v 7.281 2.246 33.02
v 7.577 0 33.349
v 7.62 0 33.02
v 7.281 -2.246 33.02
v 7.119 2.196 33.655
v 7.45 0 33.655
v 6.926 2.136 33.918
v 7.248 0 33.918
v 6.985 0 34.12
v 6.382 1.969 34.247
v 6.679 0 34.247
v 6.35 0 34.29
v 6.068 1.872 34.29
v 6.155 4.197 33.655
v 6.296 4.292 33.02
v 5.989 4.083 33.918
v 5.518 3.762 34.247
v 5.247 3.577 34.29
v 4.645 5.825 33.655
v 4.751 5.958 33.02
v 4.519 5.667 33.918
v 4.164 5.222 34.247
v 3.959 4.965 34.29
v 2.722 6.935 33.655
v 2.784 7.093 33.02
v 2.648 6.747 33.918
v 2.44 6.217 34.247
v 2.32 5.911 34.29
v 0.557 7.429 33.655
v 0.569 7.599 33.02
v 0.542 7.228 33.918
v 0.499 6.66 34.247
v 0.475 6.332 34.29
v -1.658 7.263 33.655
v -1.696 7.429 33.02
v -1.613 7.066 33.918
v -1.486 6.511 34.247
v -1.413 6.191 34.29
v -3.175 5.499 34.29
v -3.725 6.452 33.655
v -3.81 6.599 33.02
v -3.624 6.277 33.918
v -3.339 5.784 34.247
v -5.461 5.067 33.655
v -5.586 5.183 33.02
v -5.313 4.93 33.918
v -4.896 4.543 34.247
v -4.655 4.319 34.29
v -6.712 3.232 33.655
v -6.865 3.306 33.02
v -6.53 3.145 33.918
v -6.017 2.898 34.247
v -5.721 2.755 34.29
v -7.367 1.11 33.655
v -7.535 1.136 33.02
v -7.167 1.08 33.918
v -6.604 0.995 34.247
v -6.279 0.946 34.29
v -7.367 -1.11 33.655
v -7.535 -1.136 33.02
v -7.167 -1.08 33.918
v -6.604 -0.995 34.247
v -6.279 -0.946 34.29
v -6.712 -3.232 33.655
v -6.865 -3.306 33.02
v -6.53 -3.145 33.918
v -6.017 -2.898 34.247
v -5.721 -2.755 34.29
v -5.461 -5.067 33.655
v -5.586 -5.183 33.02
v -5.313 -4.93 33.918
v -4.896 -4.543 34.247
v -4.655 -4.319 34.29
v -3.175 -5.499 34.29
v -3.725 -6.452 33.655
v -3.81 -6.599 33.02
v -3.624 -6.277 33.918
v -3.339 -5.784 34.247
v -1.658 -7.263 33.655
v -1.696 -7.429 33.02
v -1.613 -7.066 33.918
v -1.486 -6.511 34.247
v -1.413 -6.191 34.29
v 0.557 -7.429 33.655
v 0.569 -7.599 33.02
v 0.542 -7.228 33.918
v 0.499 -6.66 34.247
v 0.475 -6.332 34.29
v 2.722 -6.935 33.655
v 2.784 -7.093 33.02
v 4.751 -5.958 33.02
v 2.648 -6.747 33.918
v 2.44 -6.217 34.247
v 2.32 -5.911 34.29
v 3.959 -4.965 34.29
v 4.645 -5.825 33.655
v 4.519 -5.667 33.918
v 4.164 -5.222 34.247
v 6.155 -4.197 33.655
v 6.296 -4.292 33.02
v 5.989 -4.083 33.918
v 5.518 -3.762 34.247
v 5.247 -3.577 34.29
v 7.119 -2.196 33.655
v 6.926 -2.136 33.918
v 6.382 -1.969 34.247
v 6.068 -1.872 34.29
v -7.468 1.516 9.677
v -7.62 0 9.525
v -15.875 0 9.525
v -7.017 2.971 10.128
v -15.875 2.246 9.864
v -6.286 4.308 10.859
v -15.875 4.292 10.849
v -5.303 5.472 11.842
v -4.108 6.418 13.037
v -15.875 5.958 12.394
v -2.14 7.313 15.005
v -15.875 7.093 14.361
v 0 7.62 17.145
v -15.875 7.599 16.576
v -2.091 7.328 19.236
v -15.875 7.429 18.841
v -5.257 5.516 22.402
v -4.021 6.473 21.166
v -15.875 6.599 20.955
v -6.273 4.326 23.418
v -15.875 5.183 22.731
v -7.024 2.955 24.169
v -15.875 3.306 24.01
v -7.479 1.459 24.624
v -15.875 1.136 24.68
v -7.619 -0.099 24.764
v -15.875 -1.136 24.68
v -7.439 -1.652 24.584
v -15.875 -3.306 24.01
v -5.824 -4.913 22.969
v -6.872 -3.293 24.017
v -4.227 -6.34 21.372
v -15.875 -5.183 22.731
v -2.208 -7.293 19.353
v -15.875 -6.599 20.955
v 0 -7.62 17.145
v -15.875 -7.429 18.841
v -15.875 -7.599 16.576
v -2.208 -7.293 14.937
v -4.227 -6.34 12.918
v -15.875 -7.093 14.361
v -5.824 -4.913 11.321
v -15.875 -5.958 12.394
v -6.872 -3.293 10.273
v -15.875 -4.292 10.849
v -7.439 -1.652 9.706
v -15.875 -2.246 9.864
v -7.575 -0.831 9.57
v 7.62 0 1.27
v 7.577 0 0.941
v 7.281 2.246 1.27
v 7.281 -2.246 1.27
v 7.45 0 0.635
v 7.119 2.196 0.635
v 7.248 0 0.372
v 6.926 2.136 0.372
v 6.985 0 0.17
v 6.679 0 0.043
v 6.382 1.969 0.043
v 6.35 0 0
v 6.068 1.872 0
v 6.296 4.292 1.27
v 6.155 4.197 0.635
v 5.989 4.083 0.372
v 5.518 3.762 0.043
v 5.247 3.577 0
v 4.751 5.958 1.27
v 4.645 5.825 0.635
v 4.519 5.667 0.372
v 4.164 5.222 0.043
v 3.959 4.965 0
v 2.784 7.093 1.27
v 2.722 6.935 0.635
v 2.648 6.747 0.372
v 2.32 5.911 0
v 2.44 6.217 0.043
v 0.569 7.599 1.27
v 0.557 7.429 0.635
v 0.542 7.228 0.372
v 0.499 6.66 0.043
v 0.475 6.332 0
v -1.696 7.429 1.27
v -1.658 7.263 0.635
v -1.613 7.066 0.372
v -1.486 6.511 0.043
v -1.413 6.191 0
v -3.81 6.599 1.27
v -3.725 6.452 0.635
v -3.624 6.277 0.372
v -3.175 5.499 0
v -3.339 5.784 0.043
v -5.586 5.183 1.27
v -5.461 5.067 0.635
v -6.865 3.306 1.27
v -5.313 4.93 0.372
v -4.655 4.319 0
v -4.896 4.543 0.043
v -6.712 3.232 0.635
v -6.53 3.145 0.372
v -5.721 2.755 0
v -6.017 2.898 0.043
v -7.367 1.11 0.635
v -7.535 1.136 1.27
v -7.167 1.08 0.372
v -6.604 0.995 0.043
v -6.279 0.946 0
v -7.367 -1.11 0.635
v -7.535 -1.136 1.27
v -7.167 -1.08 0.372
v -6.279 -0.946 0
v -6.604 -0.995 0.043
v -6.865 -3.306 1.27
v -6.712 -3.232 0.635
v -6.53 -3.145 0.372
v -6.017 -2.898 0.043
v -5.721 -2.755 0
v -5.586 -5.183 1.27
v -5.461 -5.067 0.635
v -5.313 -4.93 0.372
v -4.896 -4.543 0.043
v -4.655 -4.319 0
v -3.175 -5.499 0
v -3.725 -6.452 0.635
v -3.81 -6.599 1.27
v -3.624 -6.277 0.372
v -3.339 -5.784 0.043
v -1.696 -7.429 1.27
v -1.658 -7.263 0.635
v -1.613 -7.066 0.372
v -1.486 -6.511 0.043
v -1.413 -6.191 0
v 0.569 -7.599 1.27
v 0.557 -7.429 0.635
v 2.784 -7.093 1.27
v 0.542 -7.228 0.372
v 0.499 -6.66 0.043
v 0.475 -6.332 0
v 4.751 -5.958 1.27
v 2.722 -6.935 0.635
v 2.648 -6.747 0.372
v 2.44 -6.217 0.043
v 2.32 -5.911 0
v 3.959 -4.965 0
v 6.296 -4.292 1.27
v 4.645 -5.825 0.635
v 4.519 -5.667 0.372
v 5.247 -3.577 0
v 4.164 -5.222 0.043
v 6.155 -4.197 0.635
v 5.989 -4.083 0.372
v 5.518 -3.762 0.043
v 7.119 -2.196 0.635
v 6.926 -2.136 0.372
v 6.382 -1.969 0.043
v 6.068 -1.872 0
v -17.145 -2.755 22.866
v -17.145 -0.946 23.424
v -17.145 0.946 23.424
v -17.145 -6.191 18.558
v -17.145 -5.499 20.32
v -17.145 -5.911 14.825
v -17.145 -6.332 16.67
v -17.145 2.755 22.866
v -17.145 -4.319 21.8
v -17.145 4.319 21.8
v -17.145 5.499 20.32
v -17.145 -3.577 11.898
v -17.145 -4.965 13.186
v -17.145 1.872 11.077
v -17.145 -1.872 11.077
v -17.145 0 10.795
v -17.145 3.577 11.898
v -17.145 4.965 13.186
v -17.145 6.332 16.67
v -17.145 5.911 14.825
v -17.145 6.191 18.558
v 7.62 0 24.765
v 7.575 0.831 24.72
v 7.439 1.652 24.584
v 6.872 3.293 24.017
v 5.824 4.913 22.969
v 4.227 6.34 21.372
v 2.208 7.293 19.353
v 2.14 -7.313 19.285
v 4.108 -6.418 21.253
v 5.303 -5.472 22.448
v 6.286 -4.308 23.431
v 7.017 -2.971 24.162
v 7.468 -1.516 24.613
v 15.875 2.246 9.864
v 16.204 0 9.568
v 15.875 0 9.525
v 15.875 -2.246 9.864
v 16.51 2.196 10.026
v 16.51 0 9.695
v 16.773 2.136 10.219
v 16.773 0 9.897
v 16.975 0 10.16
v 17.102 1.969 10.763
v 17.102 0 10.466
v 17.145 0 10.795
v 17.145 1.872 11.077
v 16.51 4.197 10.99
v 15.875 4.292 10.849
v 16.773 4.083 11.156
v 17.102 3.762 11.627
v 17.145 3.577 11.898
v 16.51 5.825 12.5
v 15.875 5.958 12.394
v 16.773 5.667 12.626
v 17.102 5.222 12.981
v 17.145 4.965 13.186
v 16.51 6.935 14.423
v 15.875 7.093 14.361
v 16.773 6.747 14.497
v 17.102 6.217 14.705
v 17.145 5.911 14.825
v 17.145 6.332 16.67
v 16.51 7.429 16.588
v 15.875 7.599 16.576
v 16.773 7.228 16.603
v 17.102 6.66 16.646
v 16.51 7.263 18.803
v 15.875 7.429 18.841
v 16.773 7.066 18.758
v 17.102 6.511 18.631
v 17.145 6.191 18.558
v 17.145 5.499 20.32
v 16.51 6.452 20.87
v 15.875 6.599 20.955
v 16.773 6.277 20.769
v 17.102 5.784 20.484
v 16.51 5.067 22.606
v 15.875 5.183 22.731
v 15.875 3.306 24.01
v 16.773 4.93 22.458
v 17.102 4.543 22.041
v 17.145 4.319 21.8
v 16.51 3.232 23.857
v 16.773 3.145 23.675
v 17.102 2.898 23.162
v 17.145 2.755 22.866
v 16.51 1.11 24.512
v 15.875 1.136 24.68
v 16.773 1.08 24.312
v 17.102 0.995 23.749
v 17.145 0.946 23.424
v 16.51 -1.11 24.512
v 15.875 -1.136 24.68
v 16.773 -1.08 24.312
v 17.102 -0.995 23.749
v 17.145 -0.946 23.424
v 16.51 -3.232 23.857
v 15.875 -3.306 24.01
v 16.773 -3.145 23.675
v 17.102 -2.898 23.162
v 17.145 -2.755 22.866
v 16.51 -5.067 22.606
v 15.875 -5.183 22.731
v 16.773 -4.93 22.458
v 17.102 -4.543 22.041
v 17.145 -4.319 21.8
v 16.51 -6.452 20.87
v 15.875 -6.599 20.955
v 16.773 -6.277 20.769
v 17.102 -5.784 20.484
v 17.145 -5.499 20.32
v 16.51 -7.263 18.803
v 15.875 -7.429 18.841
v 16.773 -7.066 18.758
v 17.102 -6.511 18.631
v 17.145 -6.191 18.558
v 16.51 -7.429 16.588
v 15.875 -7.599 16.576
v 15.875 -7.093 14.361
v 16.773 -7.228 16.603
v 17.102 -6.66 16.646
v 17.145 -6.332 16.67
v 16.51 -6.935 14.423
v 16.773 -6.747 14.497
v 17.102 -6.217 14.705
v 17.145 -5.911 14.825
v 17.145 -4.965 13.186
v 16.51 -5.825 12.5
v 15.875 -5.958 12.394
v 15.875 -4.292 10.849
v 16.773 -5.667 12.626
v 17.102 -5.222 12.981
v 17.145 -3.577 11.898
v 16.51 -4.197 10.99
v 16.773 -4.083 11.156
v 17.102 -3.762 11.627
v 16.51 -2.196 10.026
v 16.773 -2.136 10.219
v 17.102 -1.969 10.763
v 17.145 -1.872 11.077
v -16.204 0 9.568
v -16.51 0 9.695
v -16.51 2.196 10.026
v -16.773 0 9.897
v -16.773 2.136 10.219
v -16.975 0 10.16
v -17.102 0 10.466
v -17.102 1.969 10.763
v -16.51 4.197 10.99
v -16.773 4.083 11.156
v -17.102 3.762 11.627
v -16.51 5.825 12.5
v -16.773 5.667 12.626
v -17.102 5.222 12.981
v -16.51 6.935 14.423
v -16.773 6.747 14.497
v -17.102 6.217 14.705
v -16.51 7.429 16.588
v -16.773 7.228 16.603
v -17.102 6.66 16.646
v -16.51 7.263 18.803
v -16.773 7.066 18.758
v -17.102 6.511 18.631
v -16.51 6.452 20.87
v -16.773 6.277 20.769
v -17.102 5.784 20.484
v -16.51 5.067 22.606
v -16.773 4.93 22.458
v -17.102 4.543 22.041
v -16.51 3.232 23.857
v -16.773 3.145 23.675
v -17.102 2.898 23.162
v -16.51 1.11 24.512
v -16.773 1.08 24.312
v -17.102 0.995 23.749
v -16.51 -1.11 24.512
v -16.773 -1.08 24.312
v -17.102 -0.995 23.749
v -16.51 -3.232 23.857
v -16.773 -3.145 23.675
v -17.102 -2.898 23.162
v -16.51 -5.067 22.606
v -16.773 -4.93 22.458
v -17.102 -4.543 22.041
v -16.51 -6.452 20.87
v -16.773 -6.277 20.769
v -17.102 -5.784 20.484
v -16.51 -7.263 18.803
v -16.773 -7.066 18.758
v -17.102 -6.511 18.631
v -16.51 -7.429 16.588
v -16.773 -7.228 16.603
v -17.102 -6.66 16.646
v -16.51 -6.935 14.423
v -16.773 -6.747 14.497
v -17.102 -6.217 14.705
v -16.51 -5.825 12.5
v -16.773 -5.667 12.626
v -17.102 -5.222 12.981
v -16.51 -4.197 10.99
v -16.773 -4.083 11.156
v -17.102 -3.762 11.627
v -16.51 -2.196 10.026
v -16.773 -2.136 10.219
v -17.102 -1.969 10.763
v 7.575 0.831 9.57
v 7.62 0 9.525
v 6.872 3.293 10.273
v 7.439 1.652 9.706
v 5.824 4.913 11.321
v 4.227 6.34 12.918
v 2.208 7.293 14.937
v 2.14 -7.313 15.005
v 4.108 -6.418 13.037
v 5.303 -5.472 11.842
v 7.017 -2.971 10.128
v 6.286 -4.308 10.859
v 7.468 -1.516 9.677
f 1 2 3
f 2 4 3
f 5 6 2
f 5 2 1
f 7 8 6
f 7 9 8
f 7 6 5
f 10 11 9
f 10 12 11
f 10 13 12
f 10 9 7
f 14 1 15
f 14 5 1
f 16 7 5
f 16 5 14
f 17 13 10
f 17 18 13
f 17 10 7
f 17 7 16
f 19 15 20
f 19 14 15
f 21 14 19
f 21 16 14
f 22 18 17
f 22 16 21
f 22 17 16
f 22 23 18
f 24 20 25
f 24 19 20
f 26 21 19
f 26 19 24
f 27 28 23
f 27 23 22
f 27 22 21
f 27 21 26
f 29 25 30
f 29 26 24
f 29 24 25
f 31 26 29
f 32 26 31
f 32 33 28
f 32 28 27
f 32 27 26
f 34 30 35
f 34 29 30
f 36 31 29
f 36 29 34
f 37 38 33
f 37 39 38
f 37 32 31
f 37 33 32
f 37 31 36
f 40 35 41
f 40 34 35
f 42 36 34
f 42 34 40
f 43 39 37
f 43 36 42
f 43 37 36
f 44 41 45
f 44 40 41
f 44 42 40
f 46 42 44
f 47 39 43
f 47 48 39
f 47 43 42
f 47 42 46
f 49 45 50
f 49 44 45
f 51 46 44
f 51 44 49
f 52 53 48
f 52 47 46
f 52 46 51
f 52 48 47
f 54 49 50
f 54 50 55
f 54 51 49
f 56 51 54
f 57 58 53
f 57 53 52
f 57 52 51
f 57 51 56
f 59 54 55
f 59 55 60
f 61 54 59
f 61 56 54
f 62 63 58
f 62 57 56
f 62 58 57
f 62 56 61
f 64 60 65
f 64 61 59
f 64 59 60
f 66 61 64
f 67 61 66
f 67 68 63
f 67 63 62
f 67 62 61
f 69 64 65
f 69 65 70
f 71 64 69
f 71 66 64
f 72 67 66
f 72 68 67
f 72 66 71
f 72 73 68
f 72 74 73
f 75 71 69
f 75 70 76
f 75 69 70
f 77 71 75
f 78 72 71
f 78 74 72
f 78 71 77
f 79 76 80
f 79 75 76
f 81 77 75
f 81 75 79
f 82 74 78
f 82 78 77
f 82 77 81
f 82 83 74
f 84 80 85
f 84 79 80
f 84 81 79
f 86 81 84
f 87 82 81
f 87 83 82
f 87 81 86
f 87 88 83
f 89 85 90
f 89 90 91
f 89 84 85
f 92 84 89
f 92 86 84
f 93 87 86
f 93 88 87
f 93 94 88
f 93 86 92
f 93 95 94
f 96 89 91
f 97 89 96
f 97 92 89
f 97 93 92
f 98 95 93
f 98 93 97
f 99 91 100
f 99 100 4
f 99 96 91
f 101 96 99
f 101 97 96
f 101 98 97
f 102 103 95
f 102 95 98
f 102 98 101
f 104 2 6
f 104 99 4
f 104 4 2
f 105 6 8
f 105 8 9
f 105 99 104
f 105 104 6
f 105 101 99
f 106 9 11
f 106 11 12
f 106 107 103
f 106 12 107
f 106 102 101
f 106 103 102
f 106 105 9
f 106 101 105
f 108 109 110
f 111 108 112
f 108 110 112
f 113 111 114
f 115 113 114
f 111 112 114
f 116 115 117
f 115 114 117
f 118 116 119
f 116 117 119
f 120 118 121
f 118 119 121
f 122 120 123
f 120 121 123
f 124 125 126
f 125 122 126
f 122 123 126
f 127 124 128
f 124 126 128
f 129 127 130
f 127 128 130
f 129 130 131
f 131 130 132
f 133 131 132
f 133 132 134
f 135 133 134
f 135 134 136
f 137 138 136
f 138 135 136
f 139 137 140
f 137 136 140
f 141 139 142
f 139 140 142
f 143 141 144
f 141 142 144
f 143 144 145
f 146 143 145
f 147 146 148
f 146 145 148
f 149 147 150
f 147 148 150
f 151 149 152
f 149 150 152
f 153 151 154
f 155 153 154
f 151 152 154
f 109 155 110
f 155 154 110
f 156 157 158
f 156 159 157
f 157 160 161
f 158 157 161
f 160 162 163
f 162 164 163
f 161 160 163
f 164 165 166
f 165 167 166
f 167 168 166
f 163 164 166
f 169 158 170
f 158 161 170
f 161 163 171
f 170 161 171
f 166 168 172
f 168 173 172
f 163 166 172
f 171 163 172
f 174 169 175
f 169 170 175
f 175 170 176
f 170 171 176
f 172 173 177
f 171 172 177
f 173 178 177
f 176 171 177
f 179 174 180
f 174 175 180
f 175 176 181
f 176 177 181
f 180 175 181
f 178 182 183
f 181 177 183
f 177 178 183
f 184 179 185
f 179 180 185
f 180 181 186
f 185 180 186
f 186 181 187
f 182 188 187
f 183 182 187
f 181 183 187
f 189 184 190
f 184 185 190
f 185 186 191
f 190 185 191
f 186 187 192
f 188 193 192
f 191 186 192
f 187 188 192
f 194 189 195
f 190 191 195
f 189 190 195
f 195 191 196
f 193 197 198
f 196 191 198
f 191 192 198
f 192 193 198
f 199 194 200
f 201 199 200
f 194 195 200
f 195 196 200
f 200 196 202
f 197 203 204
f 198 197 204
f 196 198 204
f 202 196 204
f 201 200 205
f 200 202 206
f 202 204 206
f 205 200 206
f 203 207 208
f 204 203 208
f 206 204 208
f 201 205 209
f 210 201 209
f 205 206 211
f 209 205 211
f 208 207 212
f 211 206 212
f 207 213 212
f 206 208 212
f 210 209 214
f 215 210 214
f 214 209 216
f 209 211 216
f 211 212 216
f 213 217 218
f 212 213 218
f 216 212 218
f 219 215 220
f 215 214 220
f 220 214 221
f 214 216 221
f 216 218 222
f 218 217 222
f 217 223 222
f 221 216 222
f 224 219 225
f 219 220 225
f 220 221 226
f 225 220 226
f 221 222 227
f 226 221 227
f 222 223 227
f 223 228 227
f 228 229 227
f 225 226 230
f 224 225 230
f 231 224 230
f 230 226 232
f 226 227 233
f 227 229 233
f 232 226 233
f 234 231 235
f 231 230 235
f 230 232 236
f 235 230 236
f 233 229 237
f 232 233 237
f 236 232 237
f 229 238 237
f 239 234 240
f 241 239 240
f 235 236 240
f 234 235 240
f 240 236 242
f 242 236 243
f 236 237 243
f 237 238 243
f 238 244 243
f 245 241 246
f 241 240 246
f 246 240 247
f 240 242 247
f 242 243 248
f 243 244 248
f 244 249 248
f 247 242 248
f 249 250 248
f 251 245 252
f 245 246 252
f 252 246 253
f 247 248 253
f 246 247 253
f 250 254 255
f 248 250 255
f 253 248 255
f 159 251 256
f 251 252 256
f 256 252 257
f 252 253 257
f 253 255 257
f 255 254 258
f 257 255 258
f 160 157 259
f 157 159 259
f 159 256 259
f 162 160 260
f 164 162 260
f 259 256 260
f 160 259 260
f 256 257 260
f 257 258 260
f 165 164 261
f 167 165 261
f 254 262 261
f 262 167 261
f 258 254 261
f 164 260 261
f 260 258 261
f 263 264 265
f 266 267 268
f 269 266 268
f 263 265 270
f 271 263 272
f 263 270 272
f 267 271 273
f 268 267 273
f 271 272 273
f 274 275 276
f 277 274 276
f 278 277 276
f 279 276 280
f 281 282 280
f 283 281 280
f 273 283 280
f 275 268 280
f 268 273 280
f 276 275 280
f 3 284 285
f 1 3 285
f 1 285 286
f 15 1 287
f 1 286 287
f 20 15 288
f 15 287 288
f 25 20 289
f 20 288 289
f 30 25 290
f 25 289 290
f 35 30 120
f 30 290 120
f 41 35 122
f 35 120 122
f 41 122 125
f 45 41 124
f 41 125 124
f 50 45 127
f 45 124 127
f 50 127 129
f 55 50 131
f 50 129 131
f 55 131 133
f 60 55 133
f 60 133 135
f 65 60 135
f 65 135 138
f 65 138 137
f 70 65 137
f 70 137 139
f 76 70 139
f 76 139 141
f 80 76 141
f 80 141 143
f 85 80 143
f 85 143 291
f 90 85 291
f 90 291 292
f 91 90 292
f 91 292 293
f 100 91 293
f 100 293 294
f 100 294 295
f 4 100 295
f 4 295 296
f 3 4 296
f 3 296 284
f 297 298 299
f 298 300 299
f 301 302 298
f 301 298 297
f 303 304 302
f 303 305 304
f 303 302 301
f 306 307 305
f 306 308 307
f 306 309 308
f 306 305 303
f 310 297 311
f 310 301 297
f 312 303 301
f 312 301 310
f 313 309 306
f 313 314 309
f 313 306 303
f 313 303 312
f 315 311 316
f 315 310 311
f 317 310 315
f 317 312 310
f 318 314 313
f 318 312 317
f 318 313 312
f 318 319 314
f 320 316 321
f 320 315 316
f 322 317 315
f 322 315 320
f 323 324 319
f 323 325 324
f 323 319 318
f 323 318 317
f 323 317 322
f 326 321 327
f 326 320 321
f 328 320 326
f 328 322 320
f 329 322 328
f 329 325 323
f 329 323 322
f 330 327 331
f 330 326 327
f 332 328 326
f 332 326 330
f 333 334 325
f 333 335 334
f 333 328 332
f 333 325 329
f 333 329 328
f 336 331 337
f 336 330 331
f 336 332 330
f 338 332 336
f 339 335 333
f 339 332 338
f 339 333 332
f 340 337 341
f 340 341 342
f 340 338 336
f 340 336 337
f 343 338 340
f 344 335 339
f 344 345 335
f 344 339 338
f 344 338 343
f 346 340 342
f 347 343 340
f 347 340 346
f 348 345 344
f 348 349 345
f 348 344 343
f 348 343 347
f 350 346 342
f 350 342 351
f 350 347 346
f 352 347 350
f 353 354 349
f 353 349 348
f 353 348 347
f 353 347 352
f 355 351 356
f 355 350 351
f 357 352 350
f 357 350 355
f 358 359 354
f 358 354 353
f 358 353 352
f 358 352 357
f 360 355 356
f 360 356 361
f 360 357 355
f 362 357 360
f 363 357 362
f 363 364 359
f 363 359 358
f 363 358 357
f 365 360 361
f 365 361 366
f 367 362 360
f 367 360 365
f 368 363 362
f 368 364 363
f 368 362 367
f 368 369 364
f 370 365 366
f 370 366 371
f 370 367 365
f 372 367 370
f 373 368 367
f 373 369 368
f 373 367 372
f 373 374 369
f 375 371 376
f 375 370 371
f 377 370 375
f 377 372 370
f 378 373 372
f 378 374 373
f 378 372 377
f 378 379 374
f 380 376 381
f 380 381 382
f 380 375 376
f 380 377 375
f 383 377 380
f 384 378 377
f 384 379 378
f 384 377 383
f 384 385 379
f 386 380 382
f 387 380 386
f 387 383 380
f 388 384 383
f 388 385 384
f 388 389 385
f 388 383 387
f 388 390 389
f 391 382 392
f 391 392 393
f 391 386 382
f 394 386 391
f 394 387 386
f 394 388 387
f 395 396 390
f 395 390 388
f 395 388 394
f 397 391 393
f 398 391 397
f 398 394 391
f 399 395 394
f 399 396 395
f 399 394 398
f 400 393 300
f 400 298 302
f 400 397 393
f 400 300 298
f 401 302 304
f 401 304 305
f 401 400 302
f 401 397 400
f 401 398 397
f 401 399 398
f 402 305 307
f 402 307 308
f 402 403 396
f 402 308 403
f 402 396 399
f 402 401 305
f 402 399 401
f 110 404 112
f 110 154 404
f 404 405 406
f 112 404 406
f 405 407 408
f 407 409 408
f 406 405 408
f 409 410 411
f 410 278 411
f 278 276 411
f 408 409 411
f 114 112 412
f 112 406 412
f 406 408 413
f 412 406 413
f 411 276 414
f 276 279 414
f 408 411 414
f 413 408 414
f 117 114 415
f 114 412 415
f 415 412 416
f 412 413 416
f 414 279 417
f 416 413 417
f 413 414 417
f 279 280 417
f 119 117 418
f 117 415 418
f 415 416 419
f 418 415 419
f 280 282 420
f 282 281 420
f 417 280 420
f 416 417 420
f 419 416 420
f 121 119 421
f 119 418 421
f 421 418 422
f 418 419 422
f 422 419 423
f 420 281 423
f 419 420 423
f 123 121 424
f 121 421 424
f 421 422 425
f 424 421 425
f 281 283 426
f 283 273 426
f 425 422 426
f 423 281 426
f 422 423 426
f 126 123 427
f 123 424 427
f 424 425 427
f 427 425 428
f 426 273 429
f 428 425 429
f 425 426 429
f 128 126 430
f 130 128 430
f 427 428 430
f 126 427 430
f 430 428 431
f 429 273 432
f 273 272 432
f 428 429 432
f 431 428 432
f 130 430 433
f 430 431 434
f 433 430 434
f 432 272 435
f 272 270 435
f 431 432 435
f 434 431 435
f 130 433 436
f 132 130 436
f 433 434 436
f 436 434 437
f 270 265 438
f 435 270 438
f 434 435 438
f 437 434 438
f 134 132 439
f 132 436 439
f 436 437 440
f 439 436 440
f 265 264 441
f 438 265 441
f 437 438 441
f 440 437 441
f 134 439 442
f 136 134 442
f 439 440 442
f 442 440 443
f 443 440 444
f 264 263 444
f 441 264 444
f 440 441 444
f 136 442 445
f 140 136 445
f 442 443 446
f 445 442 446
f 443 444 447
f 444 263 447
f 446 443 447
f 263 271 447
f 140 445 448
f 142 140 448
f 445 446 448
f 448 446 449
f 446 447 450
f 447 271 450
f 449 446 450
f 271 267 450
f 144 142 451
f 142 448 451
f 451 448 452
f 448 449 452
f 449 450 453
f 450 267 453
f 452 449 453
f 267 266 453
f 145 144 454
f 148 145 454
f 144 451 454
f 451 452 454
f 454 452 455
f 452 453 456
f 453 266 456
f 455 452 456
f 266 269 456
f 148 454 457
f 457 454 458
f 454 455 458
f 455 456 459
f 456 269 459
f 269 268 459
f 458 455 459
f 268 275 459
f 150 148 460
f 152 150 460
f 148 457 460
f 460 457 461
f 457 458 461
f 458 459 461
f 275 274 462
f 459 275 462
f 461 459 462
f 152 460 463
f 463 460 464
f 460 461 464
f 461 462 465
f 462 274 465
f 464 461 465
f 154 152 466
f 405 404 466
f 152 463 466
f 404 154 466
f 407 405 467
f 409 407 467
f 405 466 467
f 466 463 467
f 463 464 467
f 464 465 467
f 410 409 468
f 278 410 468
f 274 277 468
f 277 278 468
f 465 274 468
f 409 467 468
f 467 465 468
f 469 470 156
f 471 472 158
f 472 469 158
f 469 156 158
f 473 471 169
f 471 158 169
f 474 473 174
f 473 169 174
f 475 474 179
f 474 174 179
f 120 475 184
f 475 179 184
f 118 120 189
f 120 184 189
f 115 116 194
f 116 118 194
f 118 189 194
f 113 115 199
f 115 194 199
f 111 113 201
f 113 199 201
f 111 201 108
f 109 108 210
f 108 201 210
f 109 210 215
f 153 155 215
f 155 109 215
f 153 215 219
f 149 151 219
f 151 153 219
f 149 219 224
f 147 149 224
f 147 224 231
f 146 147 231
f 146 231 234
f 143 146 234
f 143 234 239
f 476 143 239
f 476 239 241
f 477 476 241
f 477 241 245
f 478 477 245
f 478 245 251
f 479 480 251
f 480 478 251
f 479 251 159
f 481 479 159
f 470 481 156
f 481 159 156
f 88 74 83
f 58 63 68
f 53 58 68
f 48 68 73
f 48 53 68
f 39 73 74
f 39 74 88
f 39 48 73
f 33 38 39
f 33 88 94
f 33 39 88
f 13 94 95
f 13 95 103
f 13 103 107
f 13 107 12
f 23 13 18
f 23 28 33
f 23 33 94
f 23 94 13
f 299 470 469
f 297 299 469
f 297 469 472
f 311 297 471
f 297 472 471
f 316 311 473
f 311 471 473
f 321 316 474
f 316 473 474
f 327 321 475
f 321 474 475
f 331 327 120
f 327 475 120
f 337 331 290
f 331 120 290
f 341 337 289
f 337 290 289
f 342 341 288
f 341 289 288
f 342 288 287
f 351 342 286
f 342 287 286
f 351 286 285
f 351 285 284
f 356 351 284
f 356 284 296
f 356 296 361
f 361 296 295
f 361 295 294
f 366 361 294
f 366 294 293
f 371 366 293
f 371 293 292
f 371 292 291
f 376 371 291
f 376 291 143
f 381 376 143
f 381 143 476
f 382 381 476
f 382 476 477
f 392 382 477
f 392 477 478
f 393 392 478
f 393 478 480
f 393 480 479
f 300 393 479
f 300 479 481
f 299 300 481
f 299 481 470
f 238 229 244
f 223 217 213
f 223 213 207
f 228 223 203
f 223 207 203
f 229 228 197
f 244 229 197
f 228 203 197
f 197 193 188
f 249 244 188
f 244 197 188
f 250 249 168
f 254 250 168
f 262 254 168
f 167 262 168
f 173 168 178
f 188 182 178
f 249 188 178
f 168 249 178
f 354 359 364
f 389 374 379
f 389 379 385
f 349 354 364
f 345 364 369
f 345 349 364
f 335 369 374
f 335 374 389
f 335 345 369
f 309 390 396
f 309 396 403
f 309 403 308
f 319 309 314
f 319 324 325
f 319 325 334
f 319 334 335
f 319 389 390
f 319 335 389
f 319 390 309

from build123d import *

# Parameters (mm, degrees)
SKETCH2_R                = 7.62
BOSS_EXTRUDE1_DEPTH      = 34.29
BOSS_EXTRUDE2_DEPTH      = 17.145
BOSS_EXTRUDE2_DEPTH_BACK = 17.145
SKETCH3_R                = 7.62
FILLET1_R                = 1.27


with BuildPart() as part:
    # Sketch2 → Boss-Extrude1 (new body)
    with BuildSketch(Plane.XY):
        Circle(SKETCH2_R)
    extrude(amount=BOSS_EXTRUDE1_DEPTH)

    # Sketch3 → Boss-Extrude2 (add, two sides: drawn at the far end of the back side and taken through both)
    with BuildSketch(Plane(origin=(0, 0, 0), x_dir=(0, 0, -1), z_dir=(1, 0, 0)).offset(-BOSS_EXTRUDE2_DEPTH_BACK)):
        with Locations((-17.145, 0)):
            Circle(SKETCH3_R)
    extrude(amount=BOSS_EXTRUDE2_DEPTH + BOSS_EXTRUDE2_DEPTH_BACK)

    # Fillet1
    fillet1_edges = [part.edges().sort_by_distance(p)[0] for p in [
        (-7.62, 0, 0),
        (-7.62, 0, 34.29),
        (-17.145, 0, 24.765),
        (17.145, 0, 24.765),
    ]]
    fillet(fillet1_edges, radius=FILLET1_R)


solid = part.part
